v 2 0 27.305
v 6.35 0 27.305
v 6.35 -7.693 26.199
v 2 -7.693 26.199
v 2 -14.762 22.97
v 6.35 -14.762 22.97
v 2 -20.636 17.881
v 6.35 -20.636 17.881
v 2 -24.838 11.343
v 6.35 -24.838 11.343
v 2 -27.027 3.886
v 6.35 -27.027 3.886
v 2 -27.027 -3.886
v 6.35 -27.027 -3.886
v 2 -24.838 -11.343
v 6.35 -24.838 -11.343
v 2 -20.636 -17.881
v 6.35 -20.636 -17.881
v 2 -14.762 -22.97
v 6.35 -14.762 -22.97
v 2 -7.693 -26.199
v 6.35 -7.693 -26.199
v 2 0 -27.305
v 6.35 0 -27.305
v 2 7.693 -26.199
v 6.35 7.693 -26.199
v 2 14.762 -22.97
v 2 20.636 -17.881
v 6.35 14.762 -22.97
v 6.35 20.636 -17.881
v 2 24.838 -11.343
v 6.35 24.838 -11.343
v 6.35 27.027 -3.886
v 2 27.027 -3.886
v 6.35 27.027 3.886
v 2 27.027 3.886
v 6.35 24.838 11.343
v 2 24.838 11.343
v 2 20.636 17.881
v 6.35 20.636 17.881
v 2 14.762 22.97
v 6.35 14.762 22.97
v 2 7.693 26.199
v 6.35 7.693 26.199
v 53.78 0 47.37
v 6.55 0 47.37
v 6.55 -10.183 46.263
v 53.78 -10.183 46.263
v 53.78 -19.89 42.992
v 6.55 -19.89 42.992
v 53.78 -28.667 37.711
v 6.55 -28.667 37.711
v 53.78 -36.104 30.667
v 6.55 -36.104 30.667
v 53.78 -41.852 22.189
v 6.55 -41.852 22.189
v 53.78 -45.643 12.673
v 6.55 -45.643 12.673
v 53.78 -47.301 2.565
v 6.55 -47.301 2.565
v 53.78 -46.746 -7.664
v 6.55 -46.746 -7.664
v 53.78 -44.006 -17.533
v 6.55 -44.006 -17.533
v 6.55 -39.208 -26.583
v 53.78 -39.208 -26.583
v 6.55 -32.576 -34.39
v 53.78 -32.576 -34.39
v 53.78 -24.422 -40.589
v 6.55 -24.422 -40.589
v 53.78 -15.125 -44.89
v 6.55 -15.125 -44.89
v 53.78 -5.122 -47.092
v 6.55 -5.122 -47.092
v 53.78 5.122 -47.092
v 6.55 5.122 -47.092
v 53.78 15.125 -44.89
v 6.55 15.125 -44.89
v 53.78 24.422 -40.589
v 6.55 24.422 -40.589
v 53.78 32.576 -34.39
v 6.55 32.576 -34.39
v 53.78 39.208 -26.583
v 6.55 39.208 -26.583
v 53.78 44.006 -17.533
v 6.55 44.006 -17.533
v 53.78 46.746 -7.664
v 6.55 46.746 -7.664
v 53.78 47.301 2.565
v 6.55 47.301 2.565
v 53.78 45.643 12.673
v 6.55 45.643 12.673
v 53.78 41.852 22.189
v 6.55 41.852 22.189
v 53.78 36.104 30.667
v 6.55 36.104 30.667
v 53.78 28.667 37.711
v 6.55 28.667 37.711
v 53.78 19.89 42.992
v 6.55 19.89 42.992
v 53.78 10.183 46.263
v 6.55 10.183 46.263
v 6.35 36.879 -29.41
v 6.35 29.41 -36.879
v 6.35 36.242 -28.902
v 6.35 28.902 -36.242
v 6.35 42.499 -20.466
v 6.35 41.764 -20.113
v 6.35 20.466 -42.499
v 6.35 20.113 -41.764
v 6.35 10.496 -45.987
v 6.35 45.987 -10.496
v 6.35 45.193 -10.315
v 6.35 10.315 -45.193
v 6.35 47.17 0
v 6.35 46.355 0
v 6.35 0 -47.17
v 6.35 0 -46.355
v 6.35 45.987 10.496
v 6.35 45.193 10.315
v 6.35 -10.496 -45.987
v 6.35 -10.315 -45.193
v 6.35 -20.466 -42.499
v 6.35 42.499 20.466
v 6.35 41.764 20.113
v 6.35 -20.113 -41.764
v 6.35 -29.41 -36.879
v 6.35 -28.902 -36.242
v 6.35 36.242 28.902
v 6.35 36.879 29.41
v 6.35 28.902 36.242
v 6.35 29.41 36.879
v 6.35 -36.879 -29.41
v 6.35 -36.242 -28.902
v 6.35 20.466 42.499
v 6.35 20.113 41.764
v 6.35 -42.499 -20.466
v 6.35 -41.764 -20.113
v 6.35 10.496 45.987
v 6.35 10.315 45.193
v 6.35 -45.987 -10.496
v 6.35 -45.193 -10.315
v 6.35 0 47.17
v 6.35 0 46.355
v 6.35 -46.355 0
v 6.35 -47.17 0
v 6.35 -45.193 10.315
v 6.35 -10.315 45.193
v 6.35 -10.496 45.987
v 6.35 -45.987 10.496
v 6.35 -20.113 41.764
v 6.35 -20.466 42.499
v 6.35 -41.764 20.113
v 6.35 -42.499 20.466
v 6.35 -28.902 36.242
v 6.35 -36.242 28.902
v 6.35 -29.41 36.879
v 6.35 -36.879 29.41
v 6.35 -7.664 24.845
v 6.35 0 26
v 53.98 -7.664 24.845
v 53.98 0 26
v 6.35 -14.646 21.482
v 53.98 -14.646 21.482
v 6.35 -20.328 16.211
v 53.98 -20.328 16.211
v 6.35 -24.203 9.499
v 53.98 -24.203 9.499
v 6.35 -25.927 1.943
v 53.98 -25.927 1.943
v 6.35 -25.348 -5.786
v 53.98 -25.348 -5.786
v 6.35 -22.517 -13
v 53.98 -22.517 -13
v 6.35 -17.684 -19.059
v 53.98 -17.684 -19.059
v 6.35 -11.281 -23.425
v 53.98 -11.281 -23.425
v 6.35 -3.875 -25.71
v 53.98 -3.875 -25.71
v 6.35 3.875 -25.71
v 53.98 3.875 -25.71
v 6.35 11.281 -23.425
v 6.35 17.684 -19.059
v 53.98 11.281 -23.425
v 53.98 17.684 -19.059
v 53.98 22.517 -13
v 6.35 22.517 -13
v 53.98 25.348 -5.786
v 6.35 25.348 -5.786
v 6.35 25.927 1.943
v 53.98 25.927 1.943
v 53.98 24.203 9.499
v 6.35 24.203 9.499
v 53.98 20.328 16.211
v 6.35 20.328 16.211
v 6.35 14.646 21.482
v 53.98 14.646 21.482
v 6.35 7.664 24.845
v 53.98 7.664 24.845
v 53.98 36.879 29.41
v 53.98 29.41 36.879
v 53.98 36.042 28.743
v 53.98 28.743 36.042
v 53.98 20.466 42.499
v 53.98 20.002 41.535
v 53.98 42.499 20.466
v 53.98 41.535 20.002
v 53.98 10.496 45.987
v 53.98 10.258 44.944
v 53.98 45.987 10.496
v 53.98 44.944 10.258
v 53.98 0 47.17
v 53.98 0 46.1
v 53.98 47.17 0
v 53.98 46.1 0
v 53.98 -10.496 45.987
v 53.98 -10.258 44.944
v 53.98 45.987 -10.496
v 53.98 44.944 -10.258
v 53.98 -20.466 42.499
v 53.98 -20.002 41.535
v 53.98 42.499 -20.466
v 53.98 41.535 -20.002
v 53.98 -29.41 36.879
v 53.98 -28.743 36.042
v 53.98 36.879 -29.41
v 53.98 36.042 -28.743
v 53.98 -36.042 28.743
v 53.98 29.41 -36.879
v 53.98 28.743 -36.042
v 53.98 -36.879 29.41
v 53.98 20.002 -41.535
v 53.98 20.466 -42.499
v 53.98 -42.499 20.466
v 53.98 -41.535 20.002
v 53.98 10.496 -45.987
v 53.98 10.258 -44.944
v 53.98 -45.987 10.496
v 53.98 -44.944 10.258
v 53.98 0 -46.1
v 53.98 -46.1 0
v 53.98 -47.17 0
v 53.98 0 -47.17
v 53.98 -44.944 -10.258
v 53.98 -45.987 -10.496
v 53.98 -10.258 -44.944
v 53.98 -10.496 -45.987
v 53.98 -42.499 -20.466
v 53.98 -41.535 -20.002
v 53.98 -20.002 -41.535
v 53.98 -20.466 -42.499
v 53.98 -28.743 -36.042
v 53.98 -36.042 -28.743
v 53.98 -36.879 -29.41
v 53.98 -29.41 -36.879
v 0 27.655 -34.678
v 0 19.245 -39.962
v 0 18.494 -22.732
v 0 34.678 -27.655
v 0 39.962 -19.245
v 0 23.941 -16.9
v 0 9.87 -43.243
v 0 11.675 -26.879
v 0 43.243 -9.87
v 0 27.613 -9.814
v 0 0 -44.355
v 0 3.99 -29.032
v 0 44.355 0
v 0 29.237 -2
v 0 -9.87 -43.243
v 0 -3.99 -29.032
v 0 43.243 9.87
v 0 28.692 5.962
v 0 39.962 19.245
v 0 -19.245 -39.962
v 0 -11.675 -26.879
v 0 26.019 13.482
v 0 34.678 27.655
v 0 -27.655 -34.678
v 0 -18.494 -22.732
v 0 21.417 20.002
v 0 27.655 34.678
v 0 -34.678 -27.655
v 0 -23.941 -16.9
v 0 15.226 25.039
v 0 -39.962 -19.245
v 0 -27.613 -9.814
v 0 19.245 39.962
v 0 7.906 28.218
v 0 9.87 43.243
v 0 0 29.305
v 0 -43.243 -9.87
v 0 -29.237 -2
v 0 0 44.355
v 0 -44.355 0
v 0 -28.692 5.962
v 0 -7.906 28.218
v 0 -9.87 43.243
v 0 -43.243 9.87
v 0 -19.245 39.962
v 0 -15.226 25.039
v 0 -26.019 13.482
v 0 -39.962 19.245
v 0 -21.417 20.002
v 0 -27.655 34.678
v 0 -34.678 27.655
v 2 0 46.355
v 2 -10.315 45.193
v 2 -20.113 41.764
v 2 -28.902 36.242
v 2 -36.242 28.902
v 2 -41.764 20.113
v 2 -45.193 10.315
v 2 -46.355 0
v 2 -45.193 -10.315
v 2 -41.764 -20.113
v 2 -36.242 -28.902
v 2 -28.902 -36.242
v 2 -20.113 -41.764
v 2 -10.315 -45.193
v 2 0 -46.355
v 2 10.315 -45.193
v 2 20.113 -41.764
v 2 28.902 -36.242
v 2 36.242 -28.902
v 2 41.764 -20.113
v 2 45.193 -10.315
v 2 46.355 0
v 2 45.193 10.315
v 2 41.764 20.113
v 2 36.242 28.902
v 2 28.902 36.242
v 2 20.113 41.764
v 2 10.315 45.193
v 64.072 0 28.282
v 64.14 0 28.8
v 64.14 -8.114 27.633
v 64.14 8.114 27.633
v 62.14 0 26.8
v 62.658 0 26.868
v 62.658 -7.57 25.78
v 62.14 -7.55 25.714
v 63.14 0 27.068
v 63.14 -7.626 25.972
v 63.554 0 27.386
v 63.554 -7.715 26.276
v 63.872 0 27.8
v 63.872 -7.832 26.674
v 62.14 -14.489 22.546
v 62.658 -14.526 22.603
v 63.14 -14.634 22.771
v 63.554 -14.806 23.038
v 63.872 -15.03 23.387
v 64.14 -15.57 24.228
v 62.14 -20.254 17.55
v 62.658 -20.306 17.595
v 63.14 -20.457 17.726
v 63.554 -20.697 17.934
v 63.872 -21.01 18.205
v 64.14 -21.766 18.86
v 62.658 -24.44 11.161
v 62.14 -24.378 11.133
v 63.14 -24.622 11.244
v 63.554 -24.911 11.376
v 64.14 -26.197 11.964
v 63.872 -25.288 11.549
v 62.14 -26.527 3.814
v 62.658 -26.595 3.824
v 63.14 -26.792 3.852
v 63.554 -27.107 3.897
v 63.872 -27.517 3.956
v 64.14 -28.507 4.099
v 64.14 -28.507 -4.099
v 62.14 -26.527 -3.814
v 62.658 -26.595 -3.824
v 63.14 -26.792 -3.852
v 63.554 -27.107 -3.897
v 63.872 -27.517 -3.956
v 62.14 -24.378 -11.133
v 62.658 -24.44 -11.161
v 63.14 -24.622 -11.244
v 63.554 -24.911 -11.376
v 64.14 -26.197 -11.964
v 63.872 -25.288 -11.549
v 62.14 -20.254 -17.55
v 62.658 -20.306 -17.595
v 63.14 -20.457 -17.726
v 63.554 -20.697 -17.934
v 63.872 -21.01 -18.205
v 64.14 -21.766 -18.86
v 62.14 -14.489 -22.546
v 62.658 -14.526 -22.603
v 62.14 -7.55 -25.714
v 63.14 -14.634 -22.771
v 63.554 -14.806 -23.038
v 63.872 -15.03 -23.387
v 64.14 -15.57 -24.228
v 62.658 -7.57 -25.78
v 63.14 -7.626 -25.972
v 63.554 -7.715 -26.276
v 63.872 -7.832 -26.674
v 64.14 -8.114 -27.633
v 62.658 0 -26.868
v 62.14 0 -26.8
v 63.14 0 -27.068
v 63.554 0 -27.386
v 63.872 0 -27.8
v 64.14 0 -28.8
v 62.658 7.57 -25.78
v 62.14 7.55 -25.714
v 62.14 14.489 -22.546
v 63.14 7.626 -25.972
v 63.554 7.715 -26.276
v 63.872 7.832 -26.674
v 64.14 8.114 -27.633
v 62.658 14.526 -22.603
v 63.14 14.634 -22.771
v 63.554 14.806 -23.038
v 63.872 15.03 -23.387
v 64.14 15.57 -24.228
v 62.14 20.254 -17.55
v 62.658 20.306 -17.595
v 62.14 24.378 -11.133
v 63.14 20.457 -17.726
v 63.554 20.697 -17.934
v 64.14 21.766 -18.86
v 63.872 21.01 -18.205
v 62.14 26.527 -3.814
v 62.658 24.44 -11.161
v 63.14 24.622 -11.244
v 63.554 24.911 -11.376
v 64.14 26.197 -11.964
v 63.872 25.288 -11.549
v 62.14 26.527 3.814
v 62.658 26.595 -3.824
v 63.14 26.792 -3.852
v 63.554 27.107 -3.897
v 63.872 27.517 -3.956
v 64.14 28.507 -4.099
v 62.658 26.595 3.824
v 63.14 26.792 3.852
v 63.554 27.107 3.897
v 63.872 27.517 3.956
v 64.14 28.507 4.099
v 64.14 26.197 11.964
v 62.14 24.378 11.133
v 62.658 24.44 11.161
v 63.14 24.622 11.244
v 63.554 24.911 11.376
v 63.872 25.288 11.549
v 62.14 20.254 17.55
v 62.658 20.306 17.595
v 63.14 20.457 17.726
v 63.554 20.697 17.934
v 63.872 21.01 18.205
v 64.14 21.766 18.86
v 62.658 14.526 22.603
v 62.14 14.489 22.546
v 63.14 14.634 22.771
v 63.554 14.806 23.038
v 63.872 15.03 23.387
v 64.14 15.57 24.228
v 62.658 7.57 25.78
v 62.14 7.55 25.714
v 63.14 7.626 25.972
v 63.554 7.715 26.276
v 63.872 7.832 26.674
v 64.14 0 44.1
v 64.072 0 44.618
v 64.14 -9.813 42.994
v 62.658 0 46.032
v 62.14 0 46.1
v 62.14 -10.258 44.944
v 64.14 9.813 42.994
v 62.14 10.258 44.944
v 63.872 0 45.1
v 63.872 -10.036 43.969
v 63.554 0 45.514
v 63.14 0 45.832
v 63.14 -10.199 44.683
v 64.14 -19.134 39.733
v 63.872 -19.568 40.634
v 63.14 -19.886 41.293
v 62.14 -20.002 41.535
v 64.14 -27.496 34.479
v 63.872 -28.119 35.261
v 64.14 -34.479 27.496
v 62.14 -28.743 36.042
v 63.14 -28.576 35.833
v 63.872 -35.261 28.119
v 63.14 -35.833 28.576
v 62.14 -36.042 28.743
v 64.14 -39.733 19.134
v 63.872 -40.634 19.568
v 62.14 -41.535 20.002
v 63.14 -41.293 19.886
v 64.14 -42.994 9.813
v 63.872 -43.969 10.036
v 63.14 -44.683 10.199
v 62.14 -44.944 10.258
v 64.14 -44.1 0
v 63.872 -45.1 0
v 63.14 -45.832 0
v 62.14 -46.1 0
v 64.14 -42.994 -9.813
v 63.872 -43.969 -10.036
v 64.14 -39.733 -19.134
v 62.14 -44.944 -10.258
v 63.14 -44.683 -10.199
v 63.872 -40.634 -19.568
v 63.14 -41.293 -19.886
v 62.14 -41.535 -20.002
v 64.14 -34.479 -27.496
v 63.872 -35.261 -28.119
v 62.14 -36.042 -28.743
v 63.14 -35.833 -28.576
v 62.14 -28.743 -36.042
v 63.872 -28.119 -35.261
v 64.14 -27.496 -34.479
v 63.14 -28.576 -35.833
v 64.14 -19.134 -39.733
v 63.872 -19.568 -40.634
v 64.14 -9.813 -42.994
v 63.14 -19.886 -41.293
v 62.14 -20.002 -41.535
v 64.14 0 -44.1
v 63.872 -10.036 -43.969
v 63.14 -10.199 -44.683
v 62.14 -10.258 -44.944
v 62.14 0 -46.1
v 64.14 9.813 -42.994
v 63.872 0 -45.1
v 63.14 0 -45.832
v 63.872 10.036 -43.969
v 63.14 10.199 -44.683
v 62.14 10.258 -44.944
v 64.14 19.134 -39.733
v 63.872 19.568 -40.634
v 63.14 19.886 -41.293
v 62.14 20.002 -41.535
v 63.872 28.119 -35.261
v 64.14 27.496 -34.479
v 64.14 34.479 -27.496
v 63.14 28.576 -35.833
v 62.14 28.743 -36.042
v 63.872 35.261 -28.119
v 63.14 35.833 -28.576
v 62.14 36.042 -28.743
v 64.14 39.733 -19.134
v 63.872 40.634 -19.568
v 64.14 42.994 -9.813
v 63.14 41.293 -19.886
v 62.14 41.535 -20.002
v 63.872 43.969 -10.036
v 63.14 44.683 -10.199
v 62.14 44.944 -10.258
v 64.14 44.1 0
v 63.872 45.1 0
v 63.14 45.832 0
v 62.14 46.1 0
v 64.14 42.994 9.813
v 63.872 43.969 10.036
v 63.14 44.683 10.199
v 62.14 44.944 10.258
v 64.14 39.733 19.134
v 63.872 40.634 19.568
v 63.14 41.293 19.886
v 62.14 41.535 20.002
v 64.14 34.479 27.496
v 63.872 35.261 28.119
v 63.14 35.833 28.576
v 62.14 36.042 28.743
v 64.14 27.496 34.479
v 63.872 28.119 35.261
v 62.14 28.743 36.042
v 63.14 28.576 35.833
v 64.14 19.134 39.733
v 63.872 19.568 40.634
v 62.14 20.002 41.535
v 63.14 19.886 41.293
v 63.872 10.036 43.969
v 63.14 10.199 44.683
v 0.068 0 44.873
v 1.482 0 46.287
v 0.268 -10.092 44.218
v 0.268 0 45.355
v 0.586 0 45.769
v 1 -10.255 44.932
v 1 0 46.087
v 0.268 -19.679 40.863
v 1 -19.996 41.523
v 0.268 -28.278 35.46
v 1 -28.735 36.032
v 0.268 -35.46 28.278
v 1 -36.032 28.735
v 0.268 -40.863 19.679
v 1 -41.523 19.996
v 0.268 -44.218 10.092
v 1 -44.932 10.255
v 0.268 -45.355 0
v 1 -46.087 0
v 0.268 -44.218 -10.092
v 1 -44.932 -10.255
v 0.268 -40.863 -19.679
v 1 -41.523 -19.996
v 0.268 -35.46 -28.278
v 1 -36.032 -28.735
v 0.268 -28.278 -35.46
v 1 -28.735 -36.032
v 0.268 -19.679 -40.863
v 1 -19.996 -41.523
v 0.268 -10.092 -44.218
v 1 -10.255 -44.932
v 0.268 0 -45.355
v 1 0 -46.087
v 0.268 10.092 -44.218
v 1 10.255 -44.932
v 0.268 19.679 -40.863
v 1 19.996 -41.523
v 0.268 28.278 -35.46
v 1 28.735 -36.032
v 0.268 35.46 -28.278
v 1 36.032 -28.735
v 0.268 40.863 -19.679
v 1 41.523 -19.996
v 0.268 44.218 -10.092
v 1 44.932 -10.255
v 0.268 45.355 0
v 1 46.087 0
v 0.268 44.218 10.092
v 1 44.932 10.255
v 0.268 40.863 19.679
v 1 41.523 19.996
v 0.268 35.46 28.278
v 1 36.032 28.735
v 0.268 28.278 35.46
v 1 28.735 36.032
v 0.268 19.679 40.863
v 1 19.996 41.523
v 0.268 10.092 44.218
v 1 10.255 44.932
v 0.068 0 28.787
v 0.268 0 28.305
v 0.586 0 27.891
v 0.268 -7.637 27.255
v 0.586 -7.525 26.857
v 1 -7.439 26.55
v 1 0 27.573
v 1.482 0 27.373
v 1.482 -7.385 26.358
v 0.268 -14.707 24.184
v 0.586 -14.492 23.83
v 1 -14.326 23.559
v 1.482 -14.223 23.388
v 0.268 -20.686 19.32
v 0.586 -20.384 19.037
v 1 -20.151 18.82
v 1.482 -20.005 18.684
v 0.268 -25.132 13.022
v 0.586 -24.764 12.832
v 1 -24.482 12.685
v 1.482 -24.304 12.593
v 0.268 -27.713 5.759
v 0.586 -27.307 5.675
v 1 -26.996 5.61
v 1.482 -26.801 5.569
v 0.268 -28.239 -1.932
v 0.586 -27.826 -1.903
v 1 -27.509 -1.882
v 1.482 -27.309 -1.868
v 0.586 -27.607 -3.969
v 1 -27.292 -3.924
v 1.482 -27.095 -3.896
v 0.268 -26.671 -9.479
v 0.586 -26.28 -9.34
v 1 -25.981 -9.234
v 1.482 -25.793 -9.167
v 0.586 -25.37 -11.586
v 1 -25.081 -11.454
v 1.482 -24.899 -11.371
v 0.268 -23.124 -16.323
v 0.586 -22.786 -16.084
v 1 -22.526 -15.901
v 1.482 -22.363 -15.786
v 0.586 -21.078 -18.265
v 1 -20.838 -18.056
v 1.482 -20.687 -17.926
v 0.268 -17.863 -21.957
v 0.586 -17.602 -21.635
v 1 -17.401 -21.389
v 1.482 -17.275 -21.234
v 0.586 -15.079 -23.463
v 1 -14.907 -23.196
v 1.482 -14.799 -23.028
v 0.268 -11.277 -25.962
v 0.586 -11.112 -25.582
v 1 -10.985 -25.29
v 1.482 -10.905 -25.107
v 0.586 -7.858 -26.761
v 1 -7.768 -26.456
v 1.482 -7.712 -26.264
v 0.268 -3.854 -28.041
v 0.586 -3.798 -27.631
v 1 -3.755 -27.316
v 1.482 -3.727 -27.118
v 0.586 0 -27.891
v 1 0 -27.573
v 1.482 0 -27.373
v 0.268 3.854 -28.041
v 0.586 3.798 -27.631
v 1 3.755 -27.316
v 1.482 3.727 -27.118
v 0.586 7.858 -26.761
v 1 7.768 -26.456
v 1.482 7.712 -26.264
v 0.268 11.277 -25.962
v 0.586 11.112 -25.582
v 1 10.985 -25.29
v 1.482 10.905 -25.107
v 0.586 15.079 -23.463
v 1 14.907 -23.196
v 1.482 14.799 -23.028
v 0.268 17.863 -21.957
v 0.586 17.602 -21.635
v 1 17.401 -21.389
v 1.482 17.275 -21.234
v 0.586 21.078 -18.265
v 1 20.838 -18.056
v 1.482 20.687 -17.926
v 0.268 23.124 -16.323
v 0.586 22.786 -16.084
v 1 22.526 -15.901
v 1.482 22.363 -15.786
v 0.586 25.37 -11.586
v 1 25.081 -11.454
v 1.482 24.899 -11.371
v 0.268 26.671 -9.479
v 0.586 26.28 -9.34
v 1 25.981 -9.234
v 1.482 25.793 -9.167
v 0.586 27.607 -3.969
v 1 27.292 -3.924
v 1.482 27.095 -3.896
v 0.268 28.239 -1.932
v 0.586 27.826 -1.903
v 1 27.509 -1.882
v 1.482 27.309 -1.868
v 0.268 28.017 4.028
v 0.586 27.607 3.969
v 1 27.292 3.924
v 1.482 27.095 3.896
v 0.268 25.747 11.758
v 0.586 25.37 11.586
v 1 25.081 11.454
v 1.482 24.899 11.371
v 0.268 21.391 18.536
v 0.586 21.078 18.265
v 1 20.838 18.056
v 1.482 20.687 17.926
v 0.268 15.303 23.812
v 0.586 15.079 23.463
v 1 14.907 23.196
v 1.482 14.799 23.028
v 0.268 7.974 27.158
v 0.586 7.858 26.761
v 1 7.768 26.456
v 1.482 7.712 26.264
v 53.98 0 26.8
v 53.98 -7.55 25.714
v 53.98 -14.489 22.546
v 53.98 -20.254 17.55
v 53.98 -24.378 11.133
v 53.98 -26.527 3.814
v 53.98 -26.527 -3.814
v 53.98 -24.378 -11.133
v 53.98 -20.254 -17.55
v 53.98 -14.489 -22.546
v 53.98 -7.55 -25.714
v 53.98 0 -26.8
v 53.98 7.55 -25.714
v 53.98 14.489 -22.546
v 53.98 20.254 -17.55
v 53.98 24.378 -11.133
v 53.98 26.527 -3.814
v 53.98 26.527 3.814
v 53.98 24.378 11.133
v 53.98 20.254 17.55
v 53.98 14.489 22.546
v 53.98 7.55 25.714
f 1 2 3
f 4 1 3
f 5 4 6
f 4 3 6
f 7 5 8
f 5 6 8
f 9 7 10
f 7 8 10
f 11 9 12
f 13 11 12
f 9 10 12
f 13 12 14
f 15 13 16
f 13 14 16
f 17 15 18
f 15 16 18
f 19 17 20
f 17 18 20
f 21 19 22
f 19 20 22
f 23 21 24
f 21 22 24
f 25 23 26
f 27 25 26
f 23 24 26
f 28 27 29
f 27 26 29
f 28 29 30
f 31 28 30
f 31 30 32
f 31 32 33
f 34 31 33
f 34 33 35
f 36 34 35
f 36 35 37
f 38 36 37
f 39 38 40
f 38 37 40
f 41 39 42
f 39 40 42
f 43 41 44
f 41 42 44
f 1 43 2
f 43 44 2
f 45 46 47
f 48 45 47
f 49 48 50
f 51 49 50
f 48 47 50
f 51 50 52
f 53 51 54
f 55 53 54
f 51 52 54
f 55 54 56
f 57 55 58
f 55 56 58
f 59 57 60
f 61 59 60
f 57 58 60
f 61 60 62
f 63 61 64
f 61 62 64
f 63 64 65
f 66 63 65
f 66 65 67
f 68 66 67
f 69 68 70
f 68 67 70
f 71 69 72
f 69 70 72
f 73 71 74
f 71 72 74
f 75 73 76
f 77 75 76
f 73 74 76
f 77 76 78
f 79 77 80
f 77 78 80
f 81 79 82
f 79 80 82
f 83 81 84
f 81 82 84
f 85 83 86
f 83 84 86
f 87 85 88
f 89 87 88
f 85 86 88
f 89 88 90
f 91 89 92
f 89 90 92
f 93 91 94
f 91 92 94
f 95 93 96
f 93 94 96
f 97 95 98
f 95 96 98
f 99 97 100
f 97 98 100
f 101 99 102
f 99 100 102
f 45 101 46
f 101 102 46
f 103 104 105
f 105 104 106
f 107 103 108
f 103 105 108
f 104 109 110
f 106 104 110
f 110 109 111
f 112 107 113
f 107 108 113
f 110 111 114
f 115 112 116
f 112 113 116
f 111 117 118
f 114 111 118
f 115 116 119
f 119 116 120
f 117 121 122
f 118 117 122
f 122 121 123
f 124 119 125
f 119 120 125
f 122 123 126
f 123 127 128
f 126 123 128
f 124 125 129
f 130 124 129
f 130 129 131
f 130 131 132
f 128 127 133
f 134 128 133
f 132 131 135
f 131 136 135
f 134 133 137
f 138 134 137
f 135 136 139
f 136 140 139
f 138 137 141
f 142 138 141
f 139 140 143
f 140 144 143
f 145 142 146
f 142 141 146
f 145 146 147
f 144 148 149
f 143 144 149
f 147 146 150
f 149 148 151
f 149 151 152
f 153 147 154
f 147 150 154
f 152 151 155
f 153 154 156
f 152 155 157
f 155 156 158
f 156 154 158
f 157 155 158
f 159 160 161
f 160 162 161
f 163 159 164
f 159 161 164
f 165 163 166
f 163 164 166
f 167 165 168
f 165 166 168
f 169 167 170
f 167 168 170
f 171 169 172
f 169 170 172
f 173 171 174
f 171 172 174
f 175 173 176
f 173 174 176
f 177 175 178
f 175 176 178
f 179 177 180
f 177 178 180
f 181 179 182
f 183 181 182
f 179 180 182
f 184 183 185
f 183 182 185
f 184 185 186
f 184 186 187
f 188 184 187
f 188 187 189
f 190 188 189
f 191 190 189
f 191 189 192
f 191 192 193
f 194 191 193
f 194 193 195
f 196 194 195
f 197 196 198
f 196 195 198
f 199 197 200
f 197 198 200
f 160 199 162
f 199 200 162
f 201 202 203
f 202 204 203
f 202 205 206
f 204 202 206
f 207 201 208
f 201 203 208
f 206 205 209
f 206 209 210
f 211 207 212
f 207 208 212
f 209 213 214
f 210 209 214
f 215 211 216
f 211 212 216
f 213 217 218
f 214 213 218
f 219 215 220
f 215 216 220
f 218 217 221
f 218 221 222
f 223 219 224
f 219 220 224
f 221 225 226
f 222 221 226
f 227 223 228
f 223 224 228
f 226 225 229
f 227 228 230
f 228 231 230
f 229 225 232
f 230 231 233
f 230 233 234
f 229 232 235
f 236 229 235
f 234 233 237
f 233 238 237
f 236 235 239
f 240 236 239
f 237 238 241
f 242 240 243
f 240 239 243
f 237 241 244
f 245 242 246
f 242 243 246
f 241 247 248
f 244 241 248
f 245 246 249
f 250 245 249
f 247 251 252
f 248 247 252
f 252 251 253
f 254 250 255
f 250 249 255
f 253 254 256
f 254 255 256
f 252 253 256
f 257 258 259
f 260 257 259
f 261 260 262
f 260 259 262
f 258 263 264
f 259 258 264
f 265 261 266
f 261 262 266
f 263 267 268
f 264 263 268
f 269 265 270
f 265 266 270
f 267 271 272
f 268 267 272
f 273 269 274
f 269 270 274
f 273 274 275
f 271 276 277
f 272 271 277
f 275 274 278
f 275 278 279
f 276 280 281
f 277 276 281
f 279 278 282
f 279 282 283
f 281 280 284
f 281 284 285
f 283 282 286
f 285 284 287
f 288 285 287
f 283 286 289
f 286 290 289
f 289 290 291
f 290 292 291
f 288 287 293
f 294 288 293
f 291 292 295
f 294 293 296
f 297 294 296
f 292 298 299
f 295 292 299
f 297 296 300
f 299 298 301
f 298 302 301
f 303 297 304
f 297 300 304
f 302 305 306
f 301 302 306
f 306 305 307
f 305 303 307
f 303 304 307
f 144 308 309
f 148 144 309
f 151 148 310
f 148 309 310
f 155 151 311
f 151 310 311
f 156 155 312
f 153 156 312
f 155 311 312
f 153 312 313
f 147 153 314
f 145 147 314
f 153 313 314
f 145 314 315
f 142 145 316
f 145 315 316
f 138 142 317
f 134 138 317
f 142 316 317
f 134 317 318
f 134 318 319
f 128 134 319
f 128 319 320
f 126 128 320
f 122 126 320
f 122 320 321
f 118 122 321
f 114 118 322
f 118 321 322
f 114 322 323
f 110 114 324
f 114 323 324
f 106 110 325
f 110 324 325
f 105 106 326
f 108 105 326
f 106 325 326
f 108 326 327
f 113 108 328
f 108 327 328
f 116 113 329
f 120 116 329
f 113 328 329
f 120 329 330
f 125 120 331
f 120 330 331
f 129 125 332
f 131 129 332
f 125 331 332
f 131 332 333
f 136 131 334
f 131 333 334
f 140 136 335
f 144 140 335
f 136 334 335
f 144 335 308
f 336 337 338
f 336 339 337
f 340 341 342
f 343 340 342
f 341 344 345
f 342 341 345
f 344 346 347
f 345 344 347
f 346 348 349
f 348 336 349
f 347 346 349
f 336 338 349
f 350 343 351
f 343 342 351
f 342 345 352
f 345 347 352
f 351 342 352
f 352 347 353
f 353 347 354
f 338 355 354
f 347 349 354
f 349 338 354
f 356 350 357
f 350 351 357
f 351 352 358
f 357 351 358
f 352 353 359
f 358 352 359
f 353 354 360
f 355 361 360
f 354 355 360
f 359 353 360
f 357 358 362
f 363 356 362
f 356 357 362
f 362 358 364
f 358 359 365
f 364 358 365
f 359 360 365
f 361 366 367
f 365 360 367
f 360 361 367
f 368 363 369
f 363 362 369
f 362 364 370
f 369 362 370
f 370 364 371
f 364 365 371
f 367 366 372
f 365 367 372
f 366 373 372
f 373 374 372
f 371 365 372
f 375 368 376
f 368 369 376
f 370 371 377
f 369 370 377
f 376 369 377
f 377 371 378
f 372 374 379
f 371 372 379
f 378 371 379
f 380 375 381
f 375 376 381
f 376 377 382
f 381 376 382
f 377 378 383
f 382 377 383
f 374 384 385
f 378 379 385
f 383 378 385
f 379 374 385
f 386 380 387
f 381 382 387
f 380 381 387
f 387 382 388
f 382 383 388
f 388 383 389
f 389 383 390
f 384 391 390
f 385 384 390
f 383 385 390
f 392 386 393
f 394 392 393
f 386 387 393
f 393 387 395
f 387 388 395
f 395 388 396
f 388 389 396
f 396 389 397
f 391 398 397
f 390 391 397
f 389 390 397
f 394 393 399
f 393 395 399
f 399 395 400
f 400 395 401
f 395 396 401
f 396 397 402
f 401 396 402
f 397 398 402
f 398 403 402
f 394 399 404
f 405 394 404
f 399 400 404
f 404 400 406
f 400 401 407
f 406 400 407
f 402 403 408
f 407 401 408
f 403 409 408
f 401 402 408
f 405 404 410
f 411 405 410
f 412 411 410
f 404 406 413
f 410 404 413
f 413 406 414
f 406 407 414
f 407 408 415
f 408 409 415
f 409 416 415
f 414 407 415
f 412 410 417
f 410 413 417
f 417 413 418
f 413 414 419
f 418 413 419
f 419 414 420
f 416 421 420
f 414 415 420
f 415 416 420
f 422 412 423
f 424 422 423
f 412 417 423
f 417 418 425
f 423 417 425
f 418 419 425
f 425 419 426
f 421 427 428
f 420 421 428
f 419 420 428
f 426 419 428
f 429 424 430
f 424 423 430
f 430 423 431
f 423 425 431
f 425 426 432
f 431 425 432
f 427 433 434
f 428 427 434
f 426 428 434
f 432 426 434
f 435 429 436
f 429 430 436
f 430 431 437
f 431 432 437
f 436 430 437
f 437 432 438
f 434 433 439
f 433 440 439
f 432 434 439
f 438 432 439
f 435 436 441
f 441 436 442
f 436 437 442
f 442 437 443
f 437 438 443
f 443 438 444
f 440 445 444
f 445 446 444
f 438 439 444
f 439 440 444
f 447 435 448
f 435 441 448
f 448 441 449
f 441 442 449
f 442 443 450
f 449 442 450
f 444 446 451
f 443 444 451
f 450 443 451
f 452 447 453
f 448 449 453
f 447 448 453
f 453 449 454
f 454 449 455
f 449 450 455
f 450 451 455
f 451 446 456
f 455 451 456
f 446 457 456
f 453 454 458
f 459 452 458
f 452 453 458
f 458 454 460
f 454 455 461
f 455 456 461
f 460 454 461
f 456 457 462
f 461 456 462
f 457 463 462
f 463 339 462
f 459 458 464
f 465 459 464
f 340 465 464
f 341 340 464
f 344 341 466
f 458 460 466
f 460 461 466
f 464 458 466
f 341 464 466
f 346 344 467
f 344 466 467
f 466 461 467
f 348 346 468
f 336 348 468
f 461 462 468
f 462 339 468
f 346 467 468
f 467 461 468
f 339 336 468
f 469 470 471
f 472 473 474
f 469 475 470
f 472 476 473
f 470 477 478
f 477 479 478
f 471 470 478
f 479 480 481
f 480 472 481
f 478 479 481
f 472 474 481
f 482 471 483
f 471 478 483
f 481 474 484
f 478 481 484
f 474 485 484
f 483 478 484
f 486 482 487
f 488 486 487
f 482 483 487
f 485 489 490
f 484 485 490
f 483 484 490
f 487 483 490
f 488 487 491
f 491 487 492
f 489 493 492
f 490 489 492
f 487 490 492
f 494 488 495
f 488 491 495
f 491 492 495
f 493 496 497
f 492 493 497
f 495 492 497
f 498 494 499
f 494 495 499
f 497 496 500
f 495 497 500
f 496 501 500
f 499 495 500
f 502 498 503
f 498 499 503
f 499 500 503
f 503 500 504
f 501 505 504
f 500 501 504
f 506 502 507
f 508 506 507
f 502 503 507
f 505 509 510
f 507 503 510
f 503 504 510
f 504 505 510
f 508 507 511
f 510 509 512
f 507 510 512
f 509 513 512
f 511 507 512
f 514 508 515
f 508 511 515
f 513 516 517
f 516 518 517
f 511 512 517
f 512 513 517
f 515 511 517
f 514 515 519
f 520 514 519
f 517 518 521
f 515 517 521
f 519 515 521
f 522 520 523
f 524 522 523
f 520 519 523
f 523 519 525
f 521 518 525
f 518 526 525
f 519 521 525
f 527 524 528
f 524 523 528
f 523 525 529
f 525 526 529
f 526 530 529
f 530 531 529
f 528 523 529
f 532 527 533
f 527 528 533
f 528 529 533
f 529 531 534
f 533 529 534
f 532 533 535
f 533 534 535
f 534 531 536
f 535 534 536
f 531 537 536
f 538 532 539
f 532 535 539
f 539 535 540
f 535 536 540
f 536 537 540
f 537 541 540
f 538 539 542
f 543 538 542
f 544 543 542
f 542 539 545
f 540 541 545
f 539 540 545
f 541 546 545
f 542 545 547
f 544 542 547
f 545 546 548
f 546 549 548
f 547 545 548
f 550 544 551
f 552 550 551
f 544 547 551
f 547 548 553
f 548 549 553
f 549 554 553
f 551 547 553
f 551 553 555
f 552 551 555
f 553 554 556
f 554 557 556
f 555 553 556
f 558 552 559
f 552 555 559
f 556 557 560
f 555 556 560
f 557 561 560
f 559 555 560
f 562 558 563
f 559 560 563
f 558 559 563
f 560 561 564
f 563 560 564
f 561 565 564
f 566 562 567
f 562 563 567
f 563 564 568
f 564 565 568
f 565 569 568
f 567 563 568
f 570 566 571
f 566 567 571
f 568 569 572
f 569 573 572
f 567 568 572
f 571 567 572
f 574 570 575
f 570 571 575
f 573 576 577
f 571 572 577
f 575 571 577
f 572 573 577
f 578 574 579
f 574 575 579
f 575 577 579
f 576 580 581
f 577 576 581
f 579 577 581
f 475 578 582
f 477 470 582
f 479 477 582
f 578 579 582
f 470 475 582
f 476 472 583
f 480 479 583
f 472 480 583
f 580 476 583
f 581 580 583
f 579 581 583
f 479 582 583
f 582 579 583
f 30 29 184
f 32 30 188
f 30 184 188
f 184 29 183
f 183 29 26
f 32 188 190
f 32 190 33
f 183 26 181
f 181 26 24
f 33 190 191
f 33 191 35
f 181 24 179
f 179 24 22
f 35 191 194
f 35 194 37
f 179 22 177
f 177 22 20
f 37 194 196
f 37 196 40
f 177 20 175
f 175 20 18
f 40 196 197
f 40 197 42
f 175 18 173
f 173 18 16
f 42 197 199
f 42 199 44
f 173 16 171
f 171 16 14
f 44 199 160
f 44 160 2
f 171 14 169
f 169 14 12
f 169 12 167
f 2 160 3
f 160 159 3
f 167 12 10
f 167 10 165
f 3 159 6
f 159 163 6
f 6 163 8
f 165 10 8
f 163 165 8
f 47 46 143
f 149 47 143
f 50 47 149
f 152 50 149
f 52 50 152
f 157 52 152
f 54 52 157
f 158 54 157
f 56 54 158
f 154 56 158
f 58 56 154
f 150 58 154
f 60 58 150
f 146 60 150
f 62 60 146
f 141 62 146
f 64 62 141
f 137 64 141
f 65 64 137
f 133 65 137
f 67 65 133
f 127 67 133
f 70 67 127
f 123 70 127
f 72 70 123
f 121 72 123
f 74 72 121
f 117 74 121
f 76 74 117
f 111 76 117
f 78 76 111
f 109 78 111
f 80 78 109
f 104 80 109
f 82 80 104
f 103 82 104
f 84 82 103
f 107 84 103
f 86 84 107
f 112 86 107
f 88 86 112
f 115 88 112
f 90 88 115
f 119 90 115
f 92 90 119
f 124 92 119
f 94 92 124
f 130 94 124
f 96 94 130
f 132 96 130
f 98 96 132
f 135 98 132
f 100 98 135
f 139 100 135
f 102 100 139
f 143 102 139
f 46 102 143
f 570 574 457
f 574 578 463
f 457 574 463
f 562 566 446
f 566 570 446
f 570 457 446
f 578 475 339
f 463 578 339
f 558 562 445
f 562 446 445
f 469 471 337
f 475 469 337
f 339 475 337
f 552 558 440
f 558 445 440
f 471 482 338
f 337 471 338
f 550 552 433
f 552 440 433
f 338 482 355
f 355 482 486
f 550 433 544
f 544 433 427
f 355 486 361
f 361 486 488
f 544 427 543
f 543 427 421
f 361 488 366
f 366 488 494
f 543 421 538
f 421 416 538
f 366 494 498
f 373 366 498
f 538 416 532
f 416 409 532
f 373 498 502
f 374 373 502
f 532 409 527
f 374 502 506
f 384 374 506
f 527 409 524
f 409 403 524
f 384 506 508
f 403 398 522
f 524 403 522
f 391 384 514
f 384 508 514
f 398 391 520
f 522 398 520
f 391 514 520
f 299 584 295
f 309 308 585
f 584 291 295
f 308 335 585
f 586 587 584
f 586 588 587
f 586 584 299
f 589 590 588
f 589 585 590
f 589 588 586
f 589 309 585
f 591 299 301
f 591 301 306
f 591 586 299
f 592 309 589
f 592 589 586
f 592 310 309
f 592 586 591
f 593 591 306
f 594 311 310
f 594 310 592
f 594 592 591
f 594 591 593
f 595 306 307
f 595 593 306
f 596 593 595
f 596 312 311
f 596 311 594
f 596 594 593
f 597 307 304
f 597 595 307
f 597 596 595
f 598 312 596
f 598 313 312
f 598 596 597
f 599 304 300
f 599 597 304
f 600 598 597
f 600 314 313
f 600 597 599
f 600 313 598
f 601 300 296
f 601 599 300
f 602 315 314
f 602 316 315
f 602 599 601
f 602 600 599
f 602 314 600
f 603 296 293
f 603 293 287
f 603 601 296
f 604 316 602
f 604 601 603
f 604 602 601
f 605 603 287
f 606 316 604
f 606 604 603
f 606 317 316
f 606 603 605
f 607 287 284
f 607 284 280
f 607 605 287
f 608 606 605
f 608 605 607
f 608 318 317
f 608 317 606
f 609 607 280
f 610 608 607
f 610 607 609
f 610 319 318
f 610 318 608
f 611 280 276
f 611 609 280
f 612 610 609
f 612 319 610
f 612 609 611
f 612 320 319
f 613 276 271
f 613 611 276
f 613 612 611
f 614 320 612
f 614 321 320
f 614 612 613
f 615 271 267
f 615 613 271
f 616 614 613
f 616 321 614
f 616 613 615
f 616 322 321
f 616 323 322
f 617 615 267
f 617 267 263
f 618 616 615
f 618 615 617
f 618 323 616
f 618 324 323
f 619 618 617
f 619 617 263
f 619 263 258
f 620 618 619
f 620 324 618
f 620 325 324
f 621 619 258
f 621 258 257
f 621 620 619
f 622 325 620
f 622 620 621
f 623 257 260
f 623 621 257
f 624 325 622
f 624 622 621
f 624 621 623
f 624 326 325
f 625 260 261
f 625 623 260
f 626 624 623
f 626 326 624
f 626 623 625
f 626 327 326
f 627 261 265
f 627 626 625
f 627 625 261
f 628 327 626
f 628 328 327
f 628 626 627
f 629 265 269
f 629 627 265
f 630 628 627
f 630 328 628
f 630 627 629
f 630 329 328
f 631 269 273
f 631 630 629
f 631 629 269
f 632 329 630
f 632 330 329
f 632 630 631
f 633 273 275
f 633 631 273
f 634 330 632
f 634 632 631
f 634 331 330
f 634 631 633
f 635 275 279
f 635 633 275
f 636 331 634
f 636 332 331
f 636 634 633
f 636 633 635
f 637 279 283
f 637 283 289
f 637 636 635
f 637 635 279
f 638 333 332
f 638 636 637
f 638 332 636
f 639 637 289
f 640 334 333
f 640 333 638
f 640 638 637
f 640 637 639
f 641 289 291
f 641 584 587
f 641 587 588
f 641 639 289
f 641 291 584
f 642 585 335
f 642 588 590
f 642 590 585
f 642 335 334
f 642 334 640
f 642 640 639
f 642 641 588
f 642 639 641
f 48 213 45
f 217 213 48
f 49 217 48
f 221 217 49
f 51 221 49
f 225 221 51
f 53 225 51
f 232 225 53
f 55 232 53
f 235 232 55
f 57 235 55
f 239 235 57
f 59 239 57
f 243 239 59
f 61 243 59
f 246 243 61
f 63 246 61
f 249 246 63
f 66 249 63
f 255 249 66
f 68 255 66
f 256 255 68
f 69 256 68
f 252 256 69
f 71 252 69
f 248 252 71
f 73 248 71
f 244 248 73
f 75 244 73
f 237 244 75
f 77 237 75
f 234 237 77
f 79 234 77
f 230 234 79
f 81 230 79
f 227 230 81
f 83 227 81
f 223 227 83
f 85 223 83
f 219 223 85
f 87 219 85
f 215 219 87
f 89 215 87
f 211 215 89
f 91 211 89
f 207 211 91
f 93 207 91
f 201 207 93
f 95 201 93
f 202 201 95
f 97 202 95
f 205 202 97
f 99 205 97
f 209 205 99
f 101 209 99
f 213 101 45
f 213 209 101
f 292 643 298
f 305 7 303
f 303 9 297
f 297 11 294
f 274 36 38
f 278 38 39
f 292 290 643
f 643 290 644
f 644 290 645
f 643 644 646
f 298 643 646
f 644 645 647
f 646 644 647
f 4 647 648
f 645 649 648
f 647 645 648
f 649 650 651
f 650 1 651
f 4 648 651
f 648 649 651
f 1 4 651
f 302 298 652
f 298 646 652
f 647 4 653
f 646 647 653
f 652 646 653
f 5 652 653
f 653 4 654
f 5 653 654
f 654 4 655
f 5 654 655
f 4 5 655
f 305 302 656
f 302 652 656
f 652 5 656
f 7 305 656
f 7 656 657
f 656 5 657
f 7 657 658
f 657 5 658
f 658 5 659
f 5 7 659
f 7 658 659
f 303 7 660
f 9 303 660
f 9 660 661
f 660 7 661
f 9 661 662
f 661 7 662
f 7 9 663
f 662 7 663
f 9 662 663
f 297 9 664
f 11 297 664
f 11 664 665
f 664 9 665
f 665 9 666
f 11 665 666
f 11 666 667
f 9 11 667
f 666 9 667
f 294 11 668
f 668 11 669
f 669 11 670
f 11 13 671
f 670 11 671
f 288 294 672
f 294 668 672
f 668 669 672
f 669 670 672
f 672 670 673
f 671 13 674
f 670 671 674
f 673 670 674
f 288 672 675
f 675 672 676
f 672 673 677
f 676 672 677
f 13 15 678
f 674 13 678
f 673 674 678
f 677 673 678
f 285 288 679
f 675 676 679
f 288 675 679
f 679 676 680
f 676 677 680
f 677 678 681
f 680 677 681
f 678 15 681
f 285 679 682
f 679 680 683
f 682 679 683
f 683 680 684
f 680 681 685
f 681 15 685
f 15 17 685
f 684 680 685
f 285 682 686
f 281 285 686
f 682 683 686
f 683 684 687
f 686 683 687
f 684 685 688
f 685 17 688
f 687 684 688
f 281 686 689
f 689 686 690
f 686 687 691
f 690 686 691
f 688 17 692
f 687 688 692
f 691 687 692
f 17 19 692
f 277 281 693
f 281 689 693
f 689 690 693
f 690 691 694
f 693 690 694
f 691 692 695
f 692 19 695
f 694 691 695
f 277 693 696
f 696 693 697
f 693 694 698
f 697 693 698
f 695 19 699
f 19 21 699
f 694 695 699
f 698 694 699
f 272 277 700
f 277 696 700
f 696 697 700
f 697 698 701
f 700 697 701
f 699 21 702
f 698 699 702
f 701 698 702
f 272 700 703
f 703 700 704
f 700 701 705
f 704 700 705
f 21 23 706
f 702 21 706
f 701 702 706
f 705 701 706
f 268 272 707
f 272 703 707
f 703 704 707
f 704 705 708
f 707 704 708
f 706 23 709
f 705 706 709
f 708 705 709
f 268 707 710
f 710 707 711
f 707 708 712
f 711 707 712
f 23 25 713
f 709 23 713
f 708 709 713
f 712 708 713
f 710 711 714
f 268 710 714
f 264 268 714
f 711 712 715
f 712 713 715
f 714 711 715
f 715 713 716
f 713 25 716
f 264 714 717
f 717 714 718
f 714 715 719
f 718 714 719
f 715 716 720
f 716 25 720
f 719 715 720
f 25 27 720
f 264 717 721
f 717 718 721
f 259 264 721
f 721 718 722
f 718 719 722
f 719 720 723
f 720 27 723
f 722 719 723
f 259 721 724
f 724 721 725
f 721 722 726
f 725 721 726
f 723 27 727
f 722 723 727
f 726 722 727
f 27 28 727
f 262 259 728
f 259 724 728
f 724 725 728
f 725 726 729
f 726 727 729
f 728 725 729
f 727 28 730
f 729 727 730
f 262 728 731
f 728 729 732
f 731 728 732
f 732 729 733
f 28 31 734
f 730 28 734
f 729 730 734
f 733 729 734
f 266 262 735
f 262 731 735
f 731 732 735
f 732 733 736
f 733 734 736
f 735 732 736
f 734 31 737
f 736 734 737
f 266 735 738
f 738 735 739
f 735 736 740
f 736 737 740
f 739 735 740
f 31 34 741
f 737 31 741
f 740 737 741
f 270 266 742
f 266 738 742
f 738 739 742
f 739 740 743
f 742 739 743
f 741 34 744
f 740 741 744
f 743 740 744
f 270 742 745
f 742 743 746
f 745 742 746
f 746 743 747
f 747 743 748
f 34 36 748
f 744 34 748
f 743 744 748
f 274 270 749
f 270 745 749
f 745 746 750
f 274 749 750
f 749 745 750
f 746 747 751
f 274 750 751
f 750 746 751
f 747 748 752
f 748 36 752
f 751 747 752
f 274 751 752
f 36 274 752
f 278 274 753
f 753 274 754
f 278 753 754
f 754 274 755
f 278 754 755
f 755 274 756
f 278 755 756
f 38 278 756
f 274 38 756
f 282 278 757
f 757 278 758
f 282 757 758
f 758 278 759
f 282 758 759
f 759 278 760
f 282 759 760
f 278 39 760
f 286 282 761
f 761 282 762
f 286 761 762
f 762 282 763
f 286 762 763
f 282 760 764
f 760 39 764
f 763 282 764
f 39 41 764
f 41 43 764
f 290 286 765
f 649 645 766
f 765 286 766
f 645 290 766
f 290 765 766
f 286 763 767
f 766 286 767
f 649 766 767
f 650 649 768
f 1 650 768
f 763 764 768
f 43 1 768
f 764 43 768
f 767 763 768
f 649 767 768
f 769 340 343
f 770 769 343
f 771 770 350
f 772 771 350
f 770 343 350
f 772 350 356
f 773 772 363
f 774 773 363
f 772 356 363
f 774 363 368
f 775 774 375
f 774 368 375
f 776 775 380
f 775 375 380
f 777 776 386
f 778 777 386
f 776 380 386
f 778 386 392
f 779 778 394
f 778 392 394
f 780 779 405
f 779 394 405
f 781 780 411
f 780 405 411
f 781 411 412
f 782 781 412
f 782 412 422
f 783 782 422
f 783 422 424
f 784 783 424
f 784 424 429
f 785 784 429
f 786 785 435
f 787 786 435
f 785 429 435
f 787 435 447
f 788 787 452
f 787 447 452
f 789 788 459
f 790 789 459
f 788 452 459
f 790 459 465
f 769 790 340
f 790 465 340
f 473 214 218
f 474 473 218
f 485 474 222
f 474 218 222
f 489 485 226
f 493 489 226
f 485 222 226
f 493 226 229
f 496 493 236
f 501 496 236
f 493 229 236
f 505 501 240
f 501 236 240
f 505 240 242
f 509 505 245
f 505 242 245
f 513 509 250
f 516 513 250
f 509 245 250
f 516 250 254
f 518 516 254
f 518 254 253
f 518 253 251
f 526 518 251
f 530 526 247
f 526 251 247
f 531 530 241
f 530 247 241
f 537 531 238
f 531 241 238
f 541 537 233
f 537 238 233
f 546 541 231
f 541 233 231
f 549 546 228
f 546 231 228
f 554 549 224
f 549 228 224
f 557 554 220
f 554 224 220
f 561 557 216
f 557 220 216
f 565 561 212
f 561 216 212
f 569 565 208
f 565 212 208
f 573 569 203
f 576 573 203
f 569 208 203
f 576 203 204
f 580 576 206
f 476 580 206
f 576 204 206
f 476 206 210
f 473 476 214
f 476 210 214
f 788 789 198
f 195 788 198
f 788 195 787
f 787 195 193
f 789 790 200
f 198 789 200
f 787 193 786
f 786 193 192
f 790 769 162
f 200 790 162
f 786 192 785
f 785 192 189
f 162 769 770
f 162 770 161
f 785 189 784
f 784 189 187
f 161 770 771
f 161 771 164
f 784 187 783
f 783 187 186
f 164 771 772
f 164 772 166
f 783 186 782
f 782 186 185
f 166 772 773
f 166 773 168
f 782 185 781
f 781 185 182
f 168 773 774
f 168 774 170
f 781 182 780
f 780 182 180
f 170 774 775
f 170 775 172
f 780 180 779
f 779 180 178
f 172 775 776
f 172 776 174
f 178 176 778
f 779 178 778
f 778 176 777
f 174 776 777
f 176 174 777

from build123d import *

# Parameters (mm, degrees)
FILLET1_R     = 2
CHAMFER1_SIZE = 0.2


with BuildPart() as part:
    # Sketch1 → Revolve1 (revolve)
    with BuildSketch(Plane.XY, mode=Mode.PRIVATE) as revolve1_sk:
        Polygon((0, 46.355), (0, 27.305), (6.35, 27.305), (6.35, 26), (53.98, 26), (53.98, 26.8), (64.14, 26.8), (64.14, 46.1), (53.98, 46.1), (53.98, 47.37), (6.35, 47.37), (6.35, 46.355), align=None)
    revolve(revolve1_sk.sketch.rotate(Axis((0, 0, 0), (1, 0, 0)), 90), axis=Axis((0, 0, 0), (1, 0, 0)))

    # Fillet1
    fillet1_edges = [part.edges().sort_by_distance(p)[0] for p in [
        (64.14, 0, -46.1),
        (64.14, 0, -26.8),
        (0, 0, -27.305),
        (0, 0, -46.355),
    ]]
    fillet(fillet1_edges, radius=FILLET1_R)

    # Chamfer1
    chamfer1_edges = [part.edges().sort_by_distance(p)[0] for p in [
        (53.98, 0, -47.37),
        (6.35, 0, -47.37),
    ]]
    chamfer(chamfer1_edges, length=CHAMFER1_SIZE)


solid = part.part
